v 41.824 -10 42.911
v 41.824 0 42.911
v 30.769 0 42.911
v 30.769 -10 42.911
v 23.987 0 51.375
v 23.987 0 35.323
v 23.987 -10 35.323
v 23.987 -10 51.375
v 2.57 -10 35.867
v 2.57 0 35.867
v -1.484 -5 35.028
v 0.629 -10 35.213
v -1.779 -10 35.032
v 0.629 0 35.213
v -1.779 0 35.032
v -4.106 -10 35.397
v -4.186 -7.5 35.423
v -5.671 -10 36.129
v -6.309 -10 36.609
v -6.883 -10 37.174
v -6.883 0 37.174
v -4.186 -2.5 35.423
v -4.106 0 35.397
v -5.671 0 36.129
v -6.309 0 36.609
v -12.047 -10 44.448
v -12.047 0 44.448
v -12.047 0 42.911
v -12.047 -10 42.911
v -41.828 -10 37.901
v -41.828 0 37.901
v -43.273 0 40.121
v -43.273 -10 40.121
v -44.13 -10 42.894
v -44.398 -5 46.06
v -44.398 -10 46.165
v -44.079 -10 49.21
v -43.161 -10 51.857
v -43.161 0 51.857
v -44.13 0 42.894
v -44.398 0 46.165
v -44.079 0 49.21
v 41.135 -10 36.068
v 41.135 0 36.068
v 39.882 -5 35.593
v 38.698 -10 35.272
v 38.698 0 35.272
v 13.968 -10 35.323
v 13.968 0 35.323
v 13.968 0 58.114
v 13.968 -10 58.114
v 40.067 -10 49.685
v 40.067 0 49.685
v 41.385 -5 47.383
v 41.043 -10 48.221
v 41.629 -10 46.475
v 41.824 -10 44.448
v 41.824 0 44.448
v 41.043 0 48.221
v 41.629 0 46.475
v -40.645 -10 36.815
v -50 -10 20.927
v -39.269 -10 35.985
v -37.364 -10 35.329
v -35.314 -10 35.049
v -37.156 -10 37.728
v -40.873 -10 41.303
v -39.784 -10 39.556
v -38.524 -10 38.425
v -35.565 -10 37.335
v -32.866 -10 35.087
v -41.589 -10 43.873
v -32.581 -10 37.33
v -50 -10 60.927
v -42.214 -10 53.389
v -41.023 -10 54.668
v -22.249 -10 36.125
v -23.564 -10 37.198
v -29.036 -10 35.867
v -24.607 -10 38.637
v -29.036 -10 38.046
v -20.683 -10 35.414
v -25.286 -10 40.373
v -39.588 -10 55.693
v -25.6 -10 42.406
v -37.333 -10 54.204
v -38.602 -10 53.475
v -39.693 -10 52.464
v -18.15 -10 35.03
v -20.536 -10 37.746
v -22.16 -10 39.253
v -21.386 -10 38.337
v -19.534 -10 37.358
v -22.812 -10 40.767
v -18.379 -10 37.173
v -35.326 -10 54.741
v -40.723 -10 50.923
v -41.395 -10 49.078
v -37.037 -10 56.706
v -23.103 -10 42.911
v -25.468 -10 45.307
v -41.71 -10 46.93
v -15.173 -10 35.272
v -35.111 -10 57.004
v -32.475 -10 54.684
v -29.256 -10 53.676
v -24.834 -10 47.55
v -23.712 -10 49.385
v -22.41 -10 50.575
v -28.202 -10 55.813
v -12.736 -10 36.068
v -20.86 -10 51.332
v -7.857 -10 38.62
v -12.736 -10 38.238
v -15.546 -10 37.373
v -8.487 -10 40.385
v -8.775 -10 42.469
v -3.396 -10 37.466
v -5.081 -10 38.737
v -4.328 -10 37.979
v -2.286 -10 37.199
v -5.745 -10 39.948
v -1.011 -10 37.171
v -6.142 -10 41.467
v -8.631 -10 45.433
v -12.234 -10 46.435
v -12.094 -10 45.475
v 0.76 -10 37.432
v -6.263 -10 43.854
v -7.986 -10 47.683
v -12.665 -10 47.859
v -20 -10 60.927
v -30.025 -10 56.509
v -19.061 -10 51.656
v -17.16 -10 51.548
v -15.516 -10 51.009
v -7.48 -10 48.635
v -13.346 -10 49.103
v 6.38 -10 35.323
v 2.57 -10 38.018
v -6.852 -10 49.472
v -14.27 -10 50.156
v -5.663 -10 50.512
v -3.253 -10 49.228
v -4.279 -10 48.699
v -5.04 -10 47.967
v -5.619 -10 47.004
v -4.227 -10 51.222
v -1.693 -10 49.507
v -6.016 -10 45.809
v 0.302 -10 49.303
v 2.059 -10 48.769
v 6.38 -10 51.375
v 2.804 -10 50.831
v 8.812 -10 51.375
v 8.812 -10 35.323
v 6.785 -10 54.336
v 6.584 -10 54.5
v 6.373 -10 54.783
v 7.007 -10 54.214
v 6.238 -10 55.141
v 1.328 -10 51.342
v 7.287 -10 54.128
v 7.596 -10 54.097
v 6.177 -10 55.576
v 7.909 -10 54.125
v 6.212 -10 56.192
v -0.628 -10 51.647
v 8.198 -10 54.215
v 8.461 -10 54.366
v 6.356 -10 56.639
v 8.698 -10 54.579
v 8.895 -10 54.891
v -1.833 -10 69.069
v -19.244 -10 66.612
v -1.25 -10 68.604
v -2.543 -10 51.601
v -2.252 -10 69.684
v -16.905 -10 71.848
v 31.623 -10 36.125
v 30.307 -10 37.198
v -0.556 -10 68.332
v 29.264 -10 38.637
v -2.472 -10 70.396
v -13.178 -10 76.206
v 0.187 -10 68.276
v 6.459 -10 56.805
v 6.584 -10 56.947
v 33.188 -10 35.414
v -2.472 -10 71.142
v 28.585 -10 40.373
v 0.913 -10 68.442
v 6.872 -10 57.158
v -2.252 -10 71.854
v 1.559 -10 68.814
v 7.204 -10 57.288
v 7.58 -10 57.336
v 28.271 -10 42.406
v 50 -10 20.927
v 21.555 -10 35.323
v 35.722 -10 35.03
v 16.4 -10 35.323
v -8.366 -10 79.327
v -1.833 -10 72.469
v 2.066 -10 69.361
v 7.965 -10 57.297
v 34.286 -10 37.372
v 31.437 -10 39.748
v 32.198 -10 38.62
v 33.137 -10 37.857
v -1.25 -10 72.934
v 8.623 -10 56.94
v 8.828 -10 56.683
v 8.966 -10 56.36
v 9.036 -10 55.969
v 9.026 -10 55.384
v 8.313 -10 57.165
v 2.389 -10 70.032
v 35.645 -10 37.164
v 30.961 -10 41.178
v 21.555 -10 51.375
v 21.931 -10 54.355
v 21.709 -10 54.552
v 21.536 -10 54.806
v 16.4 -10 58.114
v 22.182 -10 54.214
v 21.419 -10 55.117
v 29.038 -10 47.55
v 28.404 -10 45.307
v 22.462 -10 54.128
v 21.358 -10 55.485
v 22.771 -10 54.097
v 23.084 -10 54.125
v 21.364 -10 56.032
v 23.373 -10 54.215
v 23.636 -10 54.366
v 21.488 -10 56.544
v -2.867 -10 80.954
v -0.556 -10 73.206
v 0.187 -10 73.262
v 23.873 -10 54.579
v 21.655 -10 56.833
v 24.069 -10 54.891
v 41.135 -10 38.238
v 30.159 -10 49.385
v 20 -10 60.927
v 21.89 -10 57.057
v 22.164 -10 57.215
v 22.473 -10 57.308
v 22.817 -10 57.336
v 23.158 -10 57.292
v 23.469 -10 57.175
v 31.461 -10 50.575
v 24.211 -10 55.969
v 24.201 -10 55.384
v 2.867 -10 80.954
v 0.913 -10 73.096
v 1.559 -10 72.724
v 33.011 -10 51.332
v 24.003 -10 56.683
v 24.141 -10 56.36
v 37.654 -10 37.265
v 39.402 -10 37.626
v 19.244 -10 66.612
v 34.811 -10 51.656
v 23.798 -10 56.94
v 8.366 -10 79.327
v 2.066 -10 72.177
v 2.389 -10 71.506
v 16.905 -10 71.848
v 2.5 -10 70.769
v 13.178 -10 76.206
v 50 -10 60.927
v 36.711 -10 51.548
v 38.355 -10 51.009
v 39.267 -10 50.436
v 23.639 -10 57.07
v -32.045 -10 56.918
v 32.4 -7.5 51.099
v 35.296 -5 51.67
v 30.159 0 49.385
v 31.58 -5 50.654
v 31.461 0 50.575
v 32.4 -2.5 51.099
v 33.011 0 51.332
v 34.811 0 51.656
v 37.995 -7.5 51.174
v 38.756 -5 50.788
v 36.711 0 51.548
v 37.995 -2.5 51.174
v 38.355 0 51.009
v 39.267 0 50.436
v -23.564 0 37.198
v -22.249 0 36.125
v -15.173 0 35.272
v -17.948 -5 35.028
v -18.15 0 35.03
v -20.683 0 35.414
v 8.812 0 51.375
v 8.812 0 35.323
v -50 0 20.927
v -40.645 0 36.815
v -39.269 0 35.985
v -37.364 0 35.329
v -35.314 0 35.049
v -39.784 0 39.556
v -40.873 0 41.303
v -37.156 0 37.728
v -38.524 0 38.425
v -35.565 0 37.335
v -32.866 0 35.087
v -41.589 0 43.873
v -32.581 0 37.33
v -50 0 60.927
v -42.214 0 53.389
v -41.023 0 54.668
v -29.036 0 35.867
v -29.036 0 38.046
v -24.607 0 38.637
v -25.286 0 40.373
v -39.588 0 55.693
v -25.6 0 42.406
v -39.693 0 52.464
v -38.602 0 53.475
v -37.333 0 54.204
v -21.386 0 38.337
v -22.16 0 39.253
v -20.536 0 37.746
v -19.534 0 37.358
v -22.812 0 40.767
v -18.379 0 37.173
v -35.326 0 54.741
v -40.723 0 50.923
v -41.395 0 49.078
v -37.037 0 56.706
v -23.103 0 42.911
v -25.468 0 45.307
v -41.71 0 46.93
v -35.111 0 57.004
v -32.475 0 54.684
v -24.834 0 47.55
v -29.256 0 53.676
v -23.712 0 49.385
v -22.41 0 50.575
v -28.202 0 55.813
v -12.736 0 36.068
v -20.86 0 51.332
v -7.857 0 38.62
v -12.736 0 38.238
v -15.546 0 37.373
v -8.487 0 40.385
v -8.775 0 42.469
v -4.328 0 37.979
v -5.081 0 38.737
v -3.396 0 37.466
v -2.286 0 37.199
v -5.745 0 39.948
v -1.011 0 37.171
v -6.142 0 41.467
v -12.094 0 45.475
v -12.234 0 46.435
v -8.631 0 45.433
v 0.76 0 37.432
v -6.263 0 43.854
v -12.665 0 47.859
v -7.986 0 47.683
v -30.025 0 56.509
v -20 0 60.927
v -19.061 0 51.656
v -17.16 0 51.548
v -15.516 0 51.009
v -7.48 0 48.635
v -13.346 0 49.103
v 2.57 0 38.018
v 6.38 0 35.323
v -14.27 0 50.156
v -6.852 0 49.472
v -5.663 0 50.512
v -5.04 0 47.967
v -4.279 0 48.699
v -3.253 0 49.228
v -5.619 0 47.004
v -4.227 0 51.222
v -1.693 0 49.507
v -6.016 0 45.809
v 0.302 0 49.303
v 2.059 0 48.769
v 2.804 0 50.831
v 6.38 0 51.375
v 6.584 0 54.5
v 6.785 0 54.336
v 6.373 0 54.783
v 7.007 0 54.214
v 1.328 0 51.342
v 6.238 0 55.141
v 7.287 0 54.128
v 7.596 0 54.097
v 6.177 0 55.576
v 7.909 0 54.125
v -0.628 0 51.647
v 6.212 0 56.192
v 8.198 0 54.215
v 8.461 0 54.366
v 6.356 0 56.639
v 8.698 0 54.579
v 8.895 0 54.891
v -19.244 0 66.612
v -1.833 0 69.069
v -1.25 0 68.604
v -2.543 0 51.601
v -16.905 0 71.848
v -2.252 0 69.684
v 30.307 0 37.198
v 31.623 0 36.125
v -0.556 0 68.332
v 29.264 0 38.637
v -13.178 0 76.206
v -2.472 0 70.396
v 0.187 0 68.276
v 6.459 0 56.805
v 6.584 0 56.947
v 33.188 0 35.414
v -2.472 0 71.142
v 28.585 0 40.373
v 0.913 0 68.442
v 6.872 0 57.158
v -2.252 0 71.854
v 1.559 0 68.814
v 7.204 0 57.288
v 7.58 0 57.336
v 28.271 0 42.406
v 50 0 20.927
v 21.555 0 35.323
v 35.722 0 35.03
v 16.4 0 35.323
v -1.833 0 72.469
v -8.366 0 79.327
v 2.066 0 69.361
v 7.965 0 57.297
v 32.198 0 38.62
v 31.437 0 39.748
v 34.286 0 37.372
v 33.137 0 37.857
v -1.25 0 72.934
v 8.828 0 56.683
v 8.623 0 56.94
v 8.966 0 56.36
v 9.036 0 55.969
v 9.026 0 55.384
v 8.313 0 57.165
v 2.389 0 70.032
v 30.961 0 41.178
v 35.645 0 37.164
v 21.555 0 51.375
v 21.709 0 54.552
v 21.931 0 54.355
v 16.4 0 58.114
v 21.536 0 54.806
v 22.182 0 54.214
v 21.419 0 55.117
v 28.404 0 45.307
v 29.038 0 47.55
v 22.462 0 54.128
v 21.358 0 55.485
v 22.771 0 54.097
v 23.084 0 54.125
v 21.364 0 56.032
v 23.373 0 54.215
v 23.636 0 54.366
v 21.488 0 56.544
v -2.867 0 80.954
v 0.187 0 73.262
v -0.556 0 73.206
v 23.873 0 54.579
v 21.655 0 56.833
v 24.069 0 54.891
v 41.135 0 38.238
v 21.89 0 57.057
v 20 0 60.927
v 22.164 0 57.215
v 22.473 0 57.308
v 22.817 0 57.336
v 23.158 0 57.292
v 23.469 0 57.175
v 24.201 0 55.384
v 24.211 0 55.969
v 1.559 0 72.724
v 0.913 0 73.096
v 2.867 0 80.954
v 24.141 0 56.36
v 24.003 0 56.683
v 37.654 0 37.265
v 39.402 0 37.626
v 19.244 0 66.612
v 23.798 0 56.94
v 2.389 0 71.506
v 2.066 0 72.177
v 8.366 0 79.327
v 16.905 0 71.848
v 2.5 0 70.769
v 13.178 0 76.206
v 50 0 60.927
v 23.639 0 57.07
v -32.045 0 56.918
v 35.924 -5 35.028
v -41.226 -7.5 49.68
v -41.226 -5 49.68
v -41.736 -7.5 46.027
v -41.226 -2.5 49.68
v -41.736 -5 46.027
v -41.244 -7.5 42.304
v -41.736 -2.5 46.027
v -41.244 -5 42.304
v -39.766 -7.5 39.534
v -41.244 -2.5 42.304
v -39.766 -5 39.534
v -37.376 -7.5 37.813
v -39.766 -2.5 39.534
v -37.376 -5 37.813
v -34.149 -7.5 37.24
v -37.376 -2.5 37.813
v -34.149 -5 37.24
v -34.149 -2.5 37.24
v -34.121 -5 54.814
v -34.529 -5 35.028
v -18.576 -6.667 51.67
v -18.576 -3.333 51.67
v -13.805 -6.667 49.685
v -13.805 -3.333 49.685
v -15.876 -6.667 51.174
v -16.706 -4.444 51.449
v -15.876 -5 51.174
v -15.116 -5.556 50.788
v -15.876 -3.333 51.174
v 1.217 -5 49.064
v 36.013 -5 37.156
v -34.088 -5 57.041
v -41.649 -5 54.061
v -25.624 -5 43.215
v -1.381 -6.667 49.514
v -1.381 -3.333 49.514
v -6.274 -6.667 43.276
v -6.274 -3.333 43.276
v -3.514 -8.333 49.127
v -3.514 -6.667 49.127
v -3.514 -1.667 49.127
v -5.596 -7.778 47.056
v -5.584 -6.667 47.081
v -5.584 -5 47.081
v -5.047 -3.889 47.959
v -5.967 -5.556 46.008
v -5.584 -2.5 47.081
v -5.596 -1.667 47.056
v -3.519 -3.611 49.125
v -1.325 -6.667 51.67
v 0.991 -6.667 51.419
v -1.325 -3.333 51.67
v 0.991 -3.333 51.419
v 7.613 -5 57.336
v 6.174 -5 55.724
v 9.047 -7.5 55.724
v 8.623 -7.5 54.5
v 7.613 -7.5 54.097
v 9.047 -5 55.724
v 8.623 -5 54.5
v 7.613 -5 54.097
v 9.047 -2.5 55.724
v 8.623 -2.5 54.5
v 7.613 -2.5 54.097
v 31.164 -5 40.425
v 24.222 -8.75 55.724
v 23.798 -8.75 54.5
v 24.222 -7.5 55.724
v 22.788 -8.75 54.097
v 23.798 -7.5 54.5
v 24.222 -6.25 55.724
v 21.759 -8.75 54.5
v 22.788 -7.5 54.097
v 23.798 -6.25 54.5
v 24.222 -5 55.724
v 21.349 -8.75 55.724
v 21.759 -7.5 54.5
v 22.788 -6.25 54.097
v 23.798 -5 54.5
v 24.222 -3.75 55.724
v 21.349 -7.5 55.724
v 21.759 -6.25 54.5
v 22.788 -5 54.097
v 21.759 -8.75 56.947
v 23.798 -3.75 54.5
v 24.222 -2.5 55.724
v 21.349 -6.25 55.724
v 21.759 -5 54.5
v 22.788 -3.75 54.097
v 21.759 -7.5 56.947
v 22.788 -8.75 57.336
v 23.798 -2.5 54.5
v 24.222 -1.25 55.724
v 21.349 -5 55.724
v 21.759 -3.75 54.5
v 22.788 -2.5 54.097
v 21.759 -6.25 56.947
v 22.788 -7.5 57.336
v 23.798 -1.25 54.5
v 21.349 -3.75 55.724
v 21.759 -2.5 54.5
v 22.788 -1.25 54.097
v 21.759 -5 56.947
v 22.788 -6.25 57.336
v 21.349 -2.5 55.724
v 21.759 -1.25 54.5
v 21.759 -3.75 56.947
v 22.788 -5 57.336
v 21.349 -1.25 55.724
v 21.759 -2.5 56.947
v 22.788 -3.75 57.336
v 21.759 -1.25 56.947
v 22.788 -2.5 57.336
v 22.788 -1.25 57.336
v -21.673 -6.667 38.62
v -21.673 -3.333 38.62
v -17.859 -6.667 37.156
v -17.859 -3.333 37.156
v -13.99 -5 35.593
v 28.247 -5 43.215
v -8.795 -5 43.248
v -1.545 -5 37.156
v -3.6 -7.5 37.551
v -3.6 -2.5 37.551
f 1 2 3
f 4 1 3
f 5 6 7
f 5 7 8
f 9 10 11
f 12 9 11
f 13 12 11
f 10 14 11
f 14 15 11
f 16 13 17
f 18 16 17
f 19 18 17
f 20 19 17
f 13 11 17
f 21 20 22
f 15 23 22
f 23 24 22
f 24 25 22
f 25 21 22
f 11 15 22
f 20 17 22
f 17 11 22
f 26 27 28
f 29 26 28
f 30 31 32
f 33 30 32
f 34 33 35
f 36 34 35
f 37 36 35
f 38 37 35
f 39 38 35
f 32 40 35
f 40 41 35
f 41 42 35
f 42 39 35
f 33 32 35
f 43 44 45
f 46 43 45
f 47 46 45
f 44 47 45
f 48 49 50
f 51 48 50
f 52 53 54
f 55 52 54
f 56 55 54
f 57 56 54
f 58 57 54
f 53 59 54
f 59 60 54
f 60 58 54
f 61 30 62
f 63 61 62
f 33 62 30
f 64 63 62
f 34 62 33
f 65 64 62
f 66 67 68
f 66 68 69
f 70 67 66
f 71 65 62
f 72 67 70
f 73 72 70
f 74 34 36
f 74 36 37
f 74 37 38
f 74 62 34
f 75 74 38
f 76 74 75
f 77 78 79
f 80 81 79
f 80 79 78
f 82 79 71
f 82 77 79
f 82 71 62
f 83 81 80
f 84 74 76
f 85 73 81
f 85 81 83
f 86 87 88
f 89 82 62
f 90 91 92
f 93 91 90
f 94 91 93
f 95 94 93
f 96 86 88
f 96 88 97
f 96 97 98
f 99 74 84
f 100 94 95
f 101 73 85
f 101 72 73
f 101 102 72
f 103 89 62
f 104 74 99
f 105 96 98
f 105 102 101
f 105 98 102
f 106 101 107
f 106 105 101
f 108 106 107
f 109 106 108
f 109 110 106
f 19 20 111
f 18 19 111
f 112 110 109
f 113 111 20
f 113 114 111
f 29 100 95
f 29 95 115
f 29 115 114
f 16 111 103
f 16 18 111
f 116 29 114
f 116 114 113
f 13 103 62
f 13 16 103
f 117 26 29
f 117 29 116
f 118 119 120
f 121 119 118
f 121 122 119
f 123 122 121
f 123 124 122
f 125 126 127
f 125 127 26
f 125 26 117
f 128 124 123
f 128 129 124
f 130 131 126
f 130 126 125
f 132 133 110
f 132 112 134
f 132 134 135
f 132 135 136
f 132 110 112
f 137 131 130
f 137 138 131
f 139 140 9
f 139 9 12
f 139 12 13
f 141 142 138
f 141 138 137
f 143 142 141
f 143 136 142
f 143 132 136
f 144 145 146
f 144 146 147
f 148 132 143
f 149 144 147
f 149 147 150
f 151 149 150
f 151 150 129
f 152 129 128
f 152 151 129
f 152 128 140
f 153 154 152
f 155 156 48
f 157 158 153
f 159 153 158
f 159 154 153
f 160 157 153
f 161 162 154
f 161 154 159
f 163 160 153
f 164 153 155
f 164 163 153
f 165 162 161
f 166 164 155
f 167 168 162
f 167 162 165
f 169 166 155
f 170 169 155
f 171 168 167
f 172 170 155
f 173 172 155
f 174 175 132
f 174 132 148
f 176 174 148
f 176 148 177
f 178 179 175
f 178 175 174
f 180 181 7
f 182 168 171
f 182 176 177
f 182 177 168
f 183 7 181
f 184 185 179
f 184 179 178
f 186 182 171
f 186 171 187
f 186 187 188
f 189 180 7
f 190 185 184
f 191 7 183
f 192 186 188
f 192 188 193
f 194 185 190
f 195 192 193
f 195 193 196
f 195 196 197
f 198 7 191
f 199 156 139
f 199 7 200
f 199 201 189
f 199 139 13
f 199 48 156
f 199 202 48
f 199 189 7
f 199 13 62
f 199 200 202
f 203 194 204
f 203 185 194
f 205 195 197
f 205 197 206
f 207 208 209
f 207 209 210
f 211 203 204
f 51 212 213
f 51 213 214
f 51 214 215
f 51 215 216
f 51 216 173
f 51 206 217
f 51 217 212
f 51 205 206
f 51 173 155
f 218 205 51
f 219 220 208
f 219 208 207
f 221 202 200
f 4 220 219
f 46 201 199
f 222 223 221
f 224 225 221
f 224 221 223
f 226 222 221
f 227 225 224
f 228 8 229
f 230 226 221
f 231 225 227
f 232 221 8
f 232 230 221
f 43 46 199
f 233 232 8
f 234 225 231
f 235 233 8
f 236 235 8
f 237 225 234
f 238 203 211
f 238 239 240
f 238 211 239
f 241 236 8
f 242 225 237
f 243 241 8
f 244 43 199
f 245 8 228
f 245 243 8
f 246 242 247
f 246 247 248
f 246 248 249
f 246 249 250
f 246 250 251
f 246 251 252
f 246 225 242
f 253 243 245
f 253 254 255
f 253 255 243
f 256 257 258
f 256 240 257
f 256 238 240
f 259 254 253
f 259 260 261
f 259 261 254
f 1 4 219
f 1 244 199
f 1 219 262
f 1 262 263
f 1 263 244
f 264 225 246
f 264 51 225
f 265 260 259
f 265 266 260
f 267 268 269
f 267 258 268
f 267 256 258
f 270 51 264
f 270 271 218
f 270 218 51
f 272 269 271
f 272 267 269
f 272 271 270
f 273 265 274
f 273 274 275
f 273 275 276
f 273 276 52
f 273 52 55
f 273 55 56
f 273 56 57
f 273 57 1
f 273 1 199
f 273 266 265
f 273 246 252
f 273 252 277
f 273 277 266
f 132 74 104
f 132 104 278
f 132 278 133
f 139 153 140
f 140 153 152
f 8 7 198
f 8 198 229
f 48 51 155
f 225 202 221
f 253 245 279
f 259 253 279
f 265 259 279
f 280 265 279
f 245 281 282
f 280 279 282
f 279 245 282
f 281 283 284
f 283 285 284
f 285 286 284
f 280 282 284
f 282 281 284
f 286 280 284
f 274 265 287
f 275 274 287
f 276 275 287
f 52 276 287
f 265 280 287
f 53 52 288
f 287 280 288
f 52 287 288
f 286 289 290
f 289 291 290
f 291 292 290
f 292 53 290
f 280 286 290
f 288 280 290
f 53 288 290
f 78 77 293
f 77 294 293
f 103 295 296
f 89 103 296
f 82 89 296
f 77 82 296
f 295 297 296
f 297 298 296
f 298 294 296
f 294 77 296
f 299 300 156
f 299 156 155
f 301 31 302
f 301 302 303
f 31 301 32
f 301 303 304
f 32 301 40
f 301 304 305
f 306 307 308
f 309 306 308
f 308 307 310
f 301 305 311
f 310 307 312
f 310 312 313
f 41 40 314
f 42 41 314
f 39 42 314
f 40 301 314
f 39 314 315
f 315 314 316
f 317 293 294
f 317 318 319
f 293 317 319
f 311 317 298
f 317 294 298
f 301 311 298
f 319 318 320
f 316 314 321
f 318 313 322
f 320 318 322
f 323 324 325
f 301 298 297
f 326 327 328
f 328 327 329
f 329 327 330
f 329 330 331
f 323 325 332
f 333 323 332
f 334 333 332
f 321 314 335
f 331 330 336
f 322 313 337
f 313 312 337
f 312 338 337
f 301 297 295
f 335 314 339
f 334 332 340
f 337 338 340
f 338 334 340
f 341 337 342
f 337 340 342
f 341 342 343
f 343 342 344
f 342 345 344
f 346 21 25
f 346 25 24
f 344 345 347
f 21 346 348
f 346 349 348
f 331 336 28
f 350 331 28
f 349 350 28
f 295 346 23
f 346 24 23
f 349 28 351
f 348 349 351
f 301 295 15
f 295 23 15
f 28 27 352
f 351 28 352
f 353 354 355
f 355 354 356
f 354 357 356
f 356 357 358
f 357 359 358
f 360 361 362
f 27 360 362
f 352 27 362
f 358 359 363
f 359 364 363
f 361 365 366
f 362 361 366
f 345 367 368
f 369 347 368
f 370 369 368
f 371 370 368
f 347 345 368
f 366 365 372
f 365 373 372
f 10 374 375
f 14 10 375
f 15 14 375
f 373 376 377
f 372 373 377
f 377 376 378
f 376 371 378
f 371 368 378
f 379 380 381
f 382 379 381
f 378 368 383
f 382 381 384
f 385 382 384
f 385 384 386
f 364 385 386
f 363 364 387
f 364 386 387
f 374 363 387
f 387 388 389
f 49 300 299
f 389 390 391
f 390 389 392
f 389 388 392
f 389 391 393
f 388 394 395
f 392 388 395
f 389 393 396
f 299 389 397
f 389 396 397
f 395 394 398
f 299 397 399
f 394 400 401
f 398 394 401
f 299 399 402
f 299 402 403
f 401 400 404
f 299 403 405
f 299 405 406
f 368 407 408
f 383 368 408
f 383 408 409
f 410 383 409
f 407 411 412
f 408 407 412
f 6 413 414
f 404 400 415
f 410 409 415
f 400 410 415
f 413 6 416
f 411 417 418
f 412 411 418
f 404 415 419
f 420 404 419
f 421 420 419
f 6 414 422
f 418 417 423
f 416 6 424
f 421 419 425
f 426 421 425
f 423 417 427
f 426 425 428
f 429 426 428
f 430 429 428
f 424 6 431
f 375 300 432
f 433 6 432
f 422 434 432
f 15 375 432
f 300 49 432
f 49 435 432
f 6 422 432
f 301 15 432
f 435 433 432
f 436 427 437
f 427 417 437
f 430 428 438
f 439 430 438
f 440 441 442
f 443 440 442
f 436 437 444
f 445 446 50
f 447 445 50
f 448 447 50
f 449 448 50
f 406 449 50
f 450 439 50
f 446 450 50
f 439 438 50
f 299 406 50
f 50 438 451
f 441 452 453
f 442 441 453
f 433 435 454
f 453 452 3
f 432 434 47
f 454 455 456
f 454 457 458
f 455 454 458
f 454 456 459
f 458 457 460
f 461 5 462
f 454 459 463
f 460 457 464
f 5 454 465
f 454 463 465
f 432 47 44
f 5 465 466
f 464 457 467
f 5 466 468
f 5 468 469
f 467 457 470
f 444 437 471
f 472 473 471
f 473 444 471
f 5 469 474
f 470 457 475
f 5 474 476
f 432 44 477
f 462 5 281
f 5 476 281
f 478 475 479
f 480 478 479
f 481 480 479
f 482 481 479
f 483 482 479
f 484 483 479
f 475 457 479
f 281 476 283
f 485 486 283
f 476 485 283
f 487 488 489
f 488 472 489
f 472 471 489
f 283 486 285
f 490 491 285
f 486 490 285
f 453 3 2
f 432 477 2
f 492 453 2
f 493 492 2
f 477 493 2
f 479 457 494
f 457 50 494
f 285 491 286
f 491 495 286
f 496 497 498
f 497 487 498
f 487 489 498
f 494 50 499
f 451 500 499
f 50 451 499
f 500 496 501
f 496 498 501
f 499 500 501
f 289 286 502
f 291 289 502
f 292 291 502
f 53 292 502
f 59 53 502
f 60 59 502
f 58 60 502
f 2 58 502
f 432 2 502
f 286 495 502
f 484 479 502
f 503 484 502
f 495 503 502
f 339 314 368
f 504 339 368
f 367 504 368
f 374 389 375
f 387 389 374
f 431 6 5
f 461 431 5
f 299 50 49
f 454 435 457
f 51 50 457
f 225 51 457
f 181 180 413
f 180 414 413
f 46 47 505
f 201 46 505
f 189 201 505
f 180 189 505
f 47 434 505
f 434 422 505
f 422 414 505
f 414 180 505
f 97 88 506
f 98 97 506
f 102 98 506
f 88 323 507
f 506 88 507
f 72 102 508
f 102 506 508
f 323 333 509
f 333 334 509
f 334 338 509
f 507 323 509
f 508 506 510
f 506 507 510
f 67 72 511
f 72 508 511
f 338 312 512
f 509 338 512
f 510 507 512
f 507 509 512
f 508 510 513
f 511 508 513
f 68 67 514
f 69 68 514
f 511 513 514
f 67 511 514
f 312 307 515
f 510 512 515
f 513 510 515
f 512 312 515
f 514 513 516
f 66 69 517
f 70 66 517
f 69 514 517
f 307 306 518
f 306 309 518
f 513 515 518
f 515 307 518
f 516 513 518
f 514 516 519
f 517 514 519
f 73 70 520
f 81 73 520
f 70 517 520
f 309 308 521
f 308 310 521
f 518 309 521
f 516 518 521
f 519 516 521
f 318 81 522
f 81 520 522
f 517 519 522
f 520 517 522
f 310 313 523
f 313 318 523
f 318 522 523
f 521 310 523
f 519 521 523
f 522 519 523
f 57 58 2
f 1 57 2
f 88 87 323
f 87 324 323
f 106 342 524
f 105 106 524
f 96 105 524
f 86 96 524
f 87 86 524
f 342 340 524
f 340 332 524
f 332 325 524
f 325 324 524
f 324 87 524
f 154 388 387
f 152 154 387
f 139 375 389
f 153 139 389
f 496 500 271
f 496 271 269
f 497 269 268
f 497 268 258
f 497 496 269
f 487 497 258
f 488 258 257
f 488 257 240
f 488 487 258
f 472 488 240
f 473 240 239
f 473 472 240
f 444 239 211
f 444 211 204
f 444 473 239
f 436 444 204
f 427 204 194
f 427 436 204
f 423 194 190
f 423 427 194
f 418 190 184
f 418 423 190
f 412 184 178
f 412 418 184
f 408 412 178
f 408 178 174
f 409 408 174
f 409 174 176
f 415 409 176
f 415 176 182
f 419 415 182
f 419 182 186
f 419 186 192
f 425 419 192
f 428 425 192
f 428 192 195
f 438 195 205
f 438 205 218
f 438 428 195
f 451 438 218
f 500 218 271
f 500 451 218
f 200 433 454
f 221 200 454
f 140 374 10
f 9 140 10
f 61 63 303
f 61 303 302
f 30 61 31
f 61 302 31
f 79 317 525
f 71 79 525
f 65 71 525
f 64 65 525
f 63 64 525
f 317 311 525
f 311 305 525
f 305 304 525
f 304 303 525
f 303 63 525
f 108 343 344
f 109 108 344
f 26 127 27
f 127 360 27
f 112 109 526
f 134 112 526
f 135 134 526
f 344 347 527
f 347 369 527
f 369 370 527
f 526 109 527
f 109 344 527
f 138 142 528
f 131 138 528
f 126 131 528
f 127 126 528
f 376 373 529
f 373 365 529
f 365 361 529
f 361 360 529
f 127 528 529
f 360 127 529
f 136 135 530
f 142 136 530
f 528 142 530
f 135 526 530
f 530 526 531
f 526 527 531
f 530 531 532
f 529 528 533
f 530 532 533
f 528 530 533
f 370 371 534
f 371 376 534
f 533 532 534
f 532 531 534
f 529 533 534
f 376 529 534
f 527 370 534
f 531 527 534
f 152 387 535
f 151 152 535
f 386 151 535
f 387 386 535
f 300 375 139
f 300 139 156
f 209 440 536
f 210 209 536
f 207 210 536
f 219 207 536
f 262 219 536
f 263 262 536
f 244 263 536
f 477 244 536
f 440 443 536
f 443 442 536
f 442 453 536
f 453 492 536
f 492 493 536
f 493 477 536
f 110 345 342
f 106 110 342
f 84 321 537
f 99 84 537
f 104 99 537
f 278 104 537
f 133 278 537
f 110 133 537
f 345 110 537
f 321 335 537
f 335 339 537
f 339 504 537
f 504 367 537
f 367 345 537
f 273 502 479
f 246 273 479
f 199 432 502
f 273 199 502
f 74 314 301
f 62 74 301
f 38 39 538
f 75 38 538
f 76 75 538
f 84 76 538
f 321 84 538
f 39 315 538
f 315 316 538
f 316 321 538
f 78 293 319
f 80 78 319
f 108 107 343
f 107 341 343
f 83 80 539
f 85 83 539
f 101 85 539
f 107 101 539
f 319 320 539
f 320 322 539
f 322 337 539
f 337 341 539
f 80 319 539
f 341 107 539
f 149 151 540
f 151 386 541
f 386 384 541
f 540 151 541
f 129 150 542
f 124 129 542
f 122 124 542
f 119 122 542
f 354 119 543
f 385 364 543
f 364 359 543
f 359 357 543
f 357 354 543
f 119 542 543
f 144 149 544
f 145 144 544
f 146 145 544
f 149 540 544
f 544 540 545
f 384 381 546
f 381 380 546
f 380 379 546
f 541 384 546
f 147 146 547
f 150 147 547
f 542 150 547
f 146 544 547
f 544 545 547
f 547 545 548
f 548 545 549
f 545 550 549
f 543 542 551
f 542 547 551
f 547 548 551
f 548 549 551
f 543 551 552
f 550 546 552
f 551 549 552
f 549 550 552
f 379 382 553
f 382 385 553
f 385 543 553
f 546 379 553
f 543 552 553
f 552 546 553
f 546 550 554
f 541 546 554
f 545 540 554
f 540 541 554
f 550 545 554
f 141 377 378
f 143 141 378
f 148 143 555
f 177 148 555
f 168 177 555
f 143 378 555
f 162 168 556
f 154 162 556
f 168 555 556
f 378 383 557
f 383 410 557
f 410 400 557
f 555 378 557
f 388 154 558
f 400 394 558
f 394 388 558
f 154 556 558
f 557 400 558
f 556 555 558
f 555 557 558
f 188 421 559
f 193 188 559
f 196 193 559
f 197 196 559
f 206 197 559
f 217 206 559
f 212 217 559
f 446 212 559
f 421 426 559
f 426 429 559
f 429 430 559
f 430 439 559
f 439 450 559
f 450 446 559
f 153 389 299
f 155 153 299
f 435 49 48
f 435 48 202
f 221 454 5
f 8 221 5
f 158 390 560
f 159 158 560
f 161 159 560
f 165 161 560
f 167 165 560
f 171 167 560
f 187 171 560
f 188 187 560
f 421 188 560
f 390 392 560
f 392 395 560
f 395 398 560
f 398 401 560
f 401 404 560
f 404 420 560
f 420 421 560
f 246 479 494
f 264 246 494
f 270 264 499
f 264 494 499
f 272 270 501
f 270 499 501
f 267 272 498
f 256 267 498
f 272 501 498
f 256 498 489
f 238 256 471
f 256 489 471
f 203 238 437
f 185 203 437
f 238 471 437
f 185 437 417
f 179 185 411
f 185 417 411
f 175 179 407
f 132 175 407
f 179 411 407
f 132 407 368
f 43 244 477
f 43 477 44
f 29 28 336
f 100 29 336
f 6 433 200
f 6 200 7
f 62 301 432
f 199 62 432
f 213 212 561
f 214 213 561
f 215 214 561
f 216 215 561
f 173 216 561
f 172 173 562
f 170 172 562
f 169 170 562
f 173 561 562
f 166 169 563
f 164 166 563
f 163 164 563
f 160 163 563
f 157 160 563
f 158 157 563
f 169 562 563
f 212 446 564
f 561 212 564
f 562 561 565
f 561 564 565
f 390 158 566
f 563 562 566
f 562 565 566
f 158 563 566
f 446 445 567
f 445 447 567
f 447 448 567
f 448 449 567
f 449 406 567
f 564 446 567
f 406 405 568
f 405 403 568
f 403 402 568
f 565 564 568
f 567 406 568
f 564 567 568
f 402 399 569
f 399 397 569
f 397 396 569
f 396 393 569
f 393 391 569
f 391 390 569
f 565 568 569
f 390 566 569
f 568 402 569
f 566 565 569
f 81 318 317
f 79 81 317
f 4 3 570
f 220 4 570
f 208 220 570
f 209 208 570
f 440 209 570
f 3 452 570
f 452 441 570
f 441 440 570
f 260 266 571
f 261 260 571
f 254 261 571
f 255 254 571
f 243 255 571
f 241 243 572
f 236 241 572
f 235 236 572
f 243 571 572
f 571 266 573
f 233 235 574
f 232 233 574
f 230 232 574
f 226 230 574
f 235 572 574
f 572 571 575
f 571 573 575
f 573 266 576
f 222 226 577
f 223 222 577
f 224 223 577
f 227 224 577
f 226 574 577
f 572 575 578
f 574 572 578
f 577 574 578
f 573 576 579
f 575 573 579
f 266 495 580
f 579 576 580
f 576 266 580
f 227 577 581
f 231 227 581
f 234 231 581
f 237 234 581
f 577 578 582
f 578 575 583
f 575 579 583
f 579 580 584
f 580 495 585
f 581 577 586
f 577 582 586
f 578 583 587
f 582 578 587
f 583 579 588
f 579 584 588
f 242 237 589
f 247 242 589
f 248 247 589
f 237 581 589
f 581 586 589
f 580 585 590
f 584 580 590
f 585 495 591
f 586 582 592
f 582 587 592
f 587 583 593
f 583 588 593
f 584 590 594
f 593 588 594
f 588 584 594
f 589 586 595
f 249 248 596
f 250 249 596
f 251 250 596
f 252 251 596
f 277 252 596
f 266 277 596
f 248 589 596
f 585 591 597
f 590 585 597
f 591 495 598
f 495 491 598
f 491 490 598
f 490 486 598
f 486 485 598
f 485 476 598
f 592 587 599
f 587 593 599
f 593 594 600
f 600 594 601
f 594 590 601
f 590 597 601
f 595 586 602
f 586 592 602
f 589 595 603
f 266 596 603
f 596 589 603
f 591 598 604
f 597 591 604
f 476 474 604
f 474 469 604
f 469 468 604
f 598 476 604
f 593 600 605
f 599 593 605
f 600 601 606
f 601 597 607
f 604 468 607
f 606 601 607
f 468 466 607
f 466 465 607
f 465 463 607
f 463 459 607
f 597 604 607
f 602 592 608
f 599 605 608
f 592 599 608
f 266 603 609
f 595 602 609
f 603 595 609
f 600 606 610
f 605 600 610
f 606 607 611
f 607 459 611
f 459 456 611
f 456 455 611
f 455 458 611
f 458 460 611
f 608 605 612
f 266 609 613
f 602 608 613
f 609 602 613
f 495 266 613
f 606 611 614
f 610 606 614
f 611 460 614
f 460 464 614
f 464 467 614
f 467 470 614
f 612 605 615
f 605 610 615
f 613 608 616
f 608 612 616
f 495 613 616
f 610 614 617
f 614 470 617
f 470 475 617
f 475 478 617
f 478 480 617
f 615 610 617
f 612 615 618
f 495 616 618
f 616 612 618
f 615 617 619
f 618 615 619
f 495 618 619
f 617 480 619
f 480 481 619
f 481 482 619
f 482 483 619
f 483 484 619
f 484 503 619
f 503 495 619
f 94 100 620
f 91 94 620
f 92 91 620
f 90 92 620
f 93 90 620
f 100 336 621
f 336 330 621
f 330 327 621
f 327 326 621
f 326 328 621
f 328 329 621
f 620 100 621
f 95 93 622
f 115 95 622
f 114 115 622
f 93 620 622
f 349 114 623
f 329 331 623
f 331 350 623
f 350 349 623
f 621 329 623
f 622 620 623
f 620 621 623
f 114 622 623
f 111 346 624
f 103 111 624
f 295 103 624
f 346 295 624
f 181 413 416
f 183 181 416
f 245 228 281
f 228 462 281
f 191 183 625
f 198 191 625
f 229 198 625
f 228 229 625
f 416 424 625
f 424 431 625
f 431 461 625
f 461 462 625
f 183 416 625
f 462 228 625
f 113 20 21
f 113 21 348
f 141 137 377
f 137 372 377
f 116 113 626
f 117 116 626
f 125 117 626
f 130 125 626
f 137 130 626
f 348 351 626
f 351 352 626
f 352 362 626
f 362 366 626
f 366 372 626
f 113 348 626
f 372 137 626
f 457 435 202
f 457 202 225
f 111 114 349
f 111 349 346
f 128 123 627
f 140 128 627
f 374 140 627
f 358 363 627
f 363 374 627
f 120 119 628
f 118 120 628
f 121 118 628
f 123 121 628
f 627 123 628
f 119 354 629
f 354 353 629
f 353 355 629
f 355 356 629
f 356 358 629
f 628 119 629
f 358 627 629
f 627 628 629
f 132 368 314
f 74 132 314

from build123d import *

# Parameters (mm, degrees)
F0_W     = 2.4323057696
F0_H     = 16.0513434701
F0_H_2   = 22.7905644657
F0_R     = 2.5
F1_DEPTH = 10


with BuildPart() as f1:
    # F0 (on Front) → F1 (new body)
    with BuildSketch(Plane.XZ):
        with BuildLine():
            Line((-50, 60.9273851891), (-50, 20.9273851891))
            Line((-50, 20.9273851891), (50, 20.9273851891))
            Line((50, 20.9273851891), (50, 60.9273851891))
            Line((50, 60.9273851891), (20, 60.9273851891))
            ThreePointArc((20, 60.9273851891), (0, 81.1604265208), (-20, 60.9273851891))
            Line((-20, 60.9273851891), (-50, 60.9273851891))
        make_face()
        with BuildLine():
            add(Edge.make_bspline(
                [(-29.2562490754, 53.6756249348), (-31.688554845, 54.8144501796), (-34.1208606146, 54.8144501796)],
                knots=[0, 0, 0, 1, 1, 1], degree=2))
            add(Edge.make_bspline(
                [(-34.1208606146, 54.8144501796), (-37.6498129162, 54.8144501796), (-39.6931372237, 52.4641585736)],
                knots=[0, 0, 0, 1, 1, 1], degree=2))
            add(Edge.make_bspline(
                [(-39.6931372237, 52.4641585736), (-41.7364615311, 50.1138669677), (-41.7364615311, 46.0272183529)],
                knots=[0, 0, 0, 1, 1, 1], degree=2))
            add(Edge.make_bspline(
                [(-41.7364615311, 46.0272183529), (-41.7364615311, 41.8280931706), (-39.7657783401, 39.5340398484)],
                knots=[0, 0, 0, 1, 1, 1], degree=2))
            add(Edge.make_bspline(
                [(-39.7657783401, 39.5340398484), (-37.7950951491, 37.2399865262), (-34.1489797565, 37.2399865262)],
                knots=[0, 0, 0, 1, 1, 1], degree=2))
            add(Edge.make_bspline(
                [(-34.1489797565, 37.2399865262), (-31.9088214561, 37.2399865262), (-29.0359824643, 38.0460685924)],
                knots=[0, 0, 0, 1, 1, 1], degree=2))
            Line((-29.0359824643, 38.0460685924), (-29.0359824643, 35.8668350994))
            add(Edge.make_bspline(
                [(-29.0359824643, 35.8668350994), (-31.2620811937, 35.0279473676), (-34.5285881714, 35.0279473676)],
                knots=[0, 0, 0, 1, 1, 1], degree=2))
            add(Edge.make_bspline(
                [(-34.5285881714, 35.0279473676), (-39.2572905251, 35.0279473676), (-41.8278487421, 37.9007863595)],
                knots=[0, 0, 0, 1, 1, 1], degree=2))
            add(Edge.make_bspline(
                [(-41.8278487421, 37.9007863595), (-44.3984069592, 40.7736253514), (-44.3984069592, 46.0600240183)],
                knots=[0, 0, 0, 1, 1, 1], degree=2))
            add(Edge.make_bspline(
                [(-44.3984069592, 46.0600240183), (-44.3984069592, 49.3687097088), (-43.161164718, 51.8572537621)],
                knots=[0, 0, 0, 1, 1, 1], degree=2))
            add(Edge.make_bspline(
                [(-43.161164718, 51.8572537621), (-41.9239224768, 54.3457978155), (-39.5876904418, 55.6931733622)],
                knots=[0, 0, 0, 1, 1, 1], degree=2))
            add(Edge.make_bspline(
                [(-39.5876904418, 55.6931733622), (-37.2514584068, 57.040548909), (-34.0880549492, 57.040548909)],
                knots=[0, 0, 0, 1, 1, 1], degree=2))
            add(Edge.make_bspline(
                [(-34.0880549492, 57.040548909), (-30.723130975, 57.040548909), (-28.2017812562, 55.8126797151)],
                knots=[0, 0, 0, 1, 1, 1], degree=2))
            Line((-28.2017812562, 55.8126797151), (-29.2562490754, 53.6756249348))
        make_face(mode=Mode.SUBTRACT)
        with BuildLine():
            add(Edge.make_bspline(
                [(-15.1732455345, 35.271646597), (-16.3214438265, 35.0279473676), (-17.9476675299, 35.0279473676)],
                knots=[0, 0, 0, 1, 1, 1], degree=2))
            add(Edge.make_bspline(
                [(-17.9476675299, 35.0279473676), (-21.5047389733, 35.0279473676), (-23.5644661135, 37.1978078134)],
                knots=[0, 0, 0, 1, 1, 1], degree=2))
            add(Edge.make_bspline(
                [(-23.5644661135, 37.1978078134), (-25.6241932537, 39.3676682591), (-25.6241932537, 43.2153041683)],
                knots=[0, 0, 0, 1, 1, 1], degree=2))
            add(Edge.make_bspline(
                [(-25.6241932537, 43.2153041683), (-25.6241932537, 47.1004322666), (-23.7120916082, 49.3851125416)],
                knots=[0, 0, 0, 1, 1, 1], degree=2))
            add(Edge.make_bspline(
                [(-23.7120916082, 49.3851125416), (-21.7999899627, 51.6697928165), (-18.5756616978, 51.6697928165)],
                knots=[0, 0, 0, 1, 1, 1], degree=2))
            add(Edge.make_bspline(
                [(-18.5756616978, 51.6697928165), (-15.5622269966, 51.6697928165), (-13.8047806313, 49.6850500546)],
                knots=[0, 0, 0, 1, 1, 1], degree=2))
            add(Edge.make_bspline(
                [(-13.8047806313, 49.6850500546), (-12.047334266, 47.7003072927), (-12.047334266, 44.4478598859)],
                knots=[0, 0, 0, 1, 1, 1], degree=2))
            Line((-12.047334266, 44.4478598859), (-12.047334266, 42.9106801317))
            Line((-12.047334266, 42.9106801317), (-23.1028435349, 42.9106801317))
            add(Edge.make_bspline(
                [(-23.1028435349, 42.9106801317), (-23.0278591566, 40.0847063762), (-21.6734538244, 38.6201677384)],
                knots=[0, 0, 0, 1, 1, 1], degree=2))
            add(Edge.make_bspline(
                [(-21.6734538244, 38.6201677384), (-20.3190484922, 37.1556291006), (-17.8586235807, 37.1556291006)],
                knots=[0, 0, 0, 1, 1, 1], degree=2))
            add(Edge.make_bspline(
                [(-17.8586235807, 37.1556291006), (-15.2669760073, 37.1556291006), (-12.7362532412, 38.2382160617)],
                knots=[0, 0, 0, 1, 1, 1], degree=2))
            Line((-12.7362532412, 38.2382160617), (-12.7362532412, 36.0683556159))
            add(Edge.make_bspline(
                [(-12.7362532412, 36.0683556159), (-14.0250472424, 35.5153458263), (-15.1732455345, 35.271646597)],
                knots=[0, 0, 0, 1, 1, 1], degree=2))
        make_face(mode=Mode.SUBTRACT)
        with BuildLine():
            add(Edge.make_bspline(
                [(2.56993297, 35.8668350994), (0.9624553612, 35.0279473676), (-1.4839099794, 35.0279473676)],
                knots=[0, 0, 0, 1, 1, 1], degree=2))
            add(Edge.make_bspline(
                [(-1.4839099794, 35.0279473676), (-4.9706835682, 35.0279473676), (-6.8827852137, 37.1743751952)],
                knots=[0, 0, 0, 1, 1, 1], degree=2))
            add(Edge.make_bspline(
                [(-6.8827852137, 37.1743751952), (-8.7948868592, 39.3208030227), (-8.7948868592, 43.2481098338)],
                knots=[0, 0, 0, 1, 1, 1], degree=2))
            add(Edge.make_bspline(
                [(-8.7948868592, 43.2481098338), (-8.7948868592, 47.2738336413), (-6.85232281, 49.4718132289)],
                knots=[0, 0, 0, 1, 1, 1], degree=2))
            add(Edge.make_bspline(
                [(-6.85232281, 49.4718132289), (-4.9097587609, 51.6697928165), (-1.3245681756, 51.6697928165)],
                knots=[0, 0, 0, 1, 1, 1], degree=2))
            add(Edge.make_bspline(
                [(-1.3245681756, 51.6697928165), (-0.1669968363, 51.6697928165), (0.990574503, 51.4190638017)],
                knots=[0, 0, 0, 1, 1, 1], degree=2))
            add(Edge.make_bspline(
                [(0.990574503, 51.4190638017), (2.1481458423, 51.1683347869), (2.8042591521, 50.8309050848)],
                knots=[0, 0, 0, 1, 1, 1], degree=2))
            Line((2.8042591521, 50.8309050848), (2.0591018932, 48.7688346828))
            add(Edge.make_bspline(
                [(2.0591018932, 48.7688346828), (1.2530198269, 49.092204814), (0.3016555278, 49.3030983779)],
                knots=[0, 0, 0, 1, 1, 1], degree=2))
            add(Edge.make_bspline(
                [(0.3016555278, 49.3030983779), (-0.6497087713, 49.5139919417), (-1.3808064593, 49.5139919417)],
                knots=[0, 0, 0, 1, 1, 1], degree=2))
            add(Edge.make_bspline(
                [(-1.3808064593, 49.5139919417), (-6.2735371404, 49.5139919417), (-6.2735371404, 43.2762289756)],
                knots=[0, 0, 0, 1, 1, 1], degree=2))
            add(Edge.make_bspline(
                [(-6.2735371404, 43.2762289756), (-6.2735371404, 40.3190325582), (-5.0808168738, 38.7373308294)],
                knots=[0, 0, 0, 1, 1, 1], degree=2))
            add(Edge.make_bspline(
                [(-5.0808168738, 38.7373308294), (-3.8880966071, 37.1556291006), (-1.5448347867, 37.1556291006)],
                knots=[0, 0, 0, 1, 1, 1], degree=2))
            add(Edge.make_bspline(
                [(-1.5448347867, 37.1556291006), (0.4609973316, 37.1556291006), (2.56993297, 38.0179494505)],
                knots=[0, 0, 0, 1, 1, 1], degree=2))
            Line((2.56993297, 38.0179494505), (2.56993297, 35.8668350994))
        make_face(mode=Mode.SUBTRACT)
        with Locations((7.5962295749, 43.3488700921)):
            Rectangle(F0_W, F0_H, mode=Mode.SUBTRACT)
        with Locations((22.7711931242, 43.3488700921)):
            Rectangle(F0_W, F0_H, mode=Mode.SUBTRACT)
        with Locations((15.1837113495, 46.7184805899)):
            Rectangle(F0_W, F0_H_2, mode=Mode.SUBTRACT)
        with BuildLine():
            add(Edge.make_bspline(
                [(38.6983437178, 35.271646597), (37.5501454258, 35.0279473676), (35.9239217224, 35.0279473676)],
                knots=[0, 0, 0, 1, 1, 1], degree=2))
            add(Edge.make_bspline(
                [(35.9239217224, 35.0279473676), (32.3668502789, 35.0279473676), (30.3071231387, 37.1978078134)],
                knots=[0, 0, 0, 1, 1, 1], degree=2))
            add(Edge.make_bspline(
                [(30.3071231387, 37.1978078134), (28.2473959986, 39.3676682591), (28.2473959986, 43.2153041683)],
                knots=[0, 0, 0, 1, 1, 1], degree=2))
            add(Edge.make_bspline(
                [(28.2473959986, 43.2153041683), (28.2473959986, 47.1004322666), (30.1594976441, 49.3851125416)],
                knots=[0, 0, 0, 1, 1, 1], degree=2))
            add(Edge.make_bspline(
                [(30.1594976441, 49.3851125416), (32.0715992895, 51.6697928165), (35.2959275545, 51.6697928165)],
                knots=[0, 0, 0, 1, 1, 1], degree=2))
            add(Edge.make_bspline(
                [(35.2959275545, 51.6697928165), (38.3093622556, 51.6697928165), (40.0668086209, 49.6850500546)],
                knots=[0, 0, 0, 1, 1, 1], degree=2))
            add(Edge.make_bspline(
                [(40.0668086209, 49.6850500546), (41.8242549863, 47.7003072927), (41.8242549863, 44.4478598859)],
                knots=[0, 0, 0, 1, 1, 1], degree=2))
            Line((41.8242549863, 44.4478598859), (41.8242549863, 42.9106801317))
            Line((41.8242549863, 42.9106801317), (30.7687457174, 42.9106801317))
            add(Edge.make_bspline(
                [(30.7687457174, 42.9106801317), (30.8437300956, 40.0847063762), (32.1981354278, 38.6201677384)],
                knots=[0, 0, 0, 1, 1, 1], degree=2))
            add(Edge.make_bspline(
                [(32.1981354278, 38.6201677384), (33.5525407601, 37.1556291006), (36.0129656715, 37.1556291006)],
                knots=[0, 0, 0, 1, 1, 1], degree=2))
            add(Edge.make_bspline(
                [(36.0129656715, 37.1556291006), (38.604613245, 37.1556291006), (41.1353360111, 38.2382160617)],
                knots=[0, 0, 0, 1, 1, 1], degree=2))
            Line((41.1353360111, 38.2382160617), (41.1353360111, 36.0683556159))
            add(Edge.make_bspline(
                [(41.1353360111, 36.0683556159), (39.8465420098, 35.5153458263), (38.6983437178, 35.271646597)],
                knots=[0, 0, 0, 1, 1, 1], degree=2))
        make_face(mode=Mode.SUBTRACT)
        with BuildLine():
            add(Edge.make_bspline(
                [(6.5839404685, 54.5004530956), (6.1738696499, 54.9034941287), (6.1738696499, 55.7236357659)],
                knots=[0, 0, 0, 1, 1, 1], degree=2))
            add(Edge.make_bspline(
                [(6.1738696499, 55.7236357659), (6.1738696499, 56.557836974), (6.5839404685, 56.9468184362)],
                knots=[0, 0, 0, 1, 1, 1], degree=2))
            add(Edge.make_bspline(
                [(6.5839404685, 56.9468184362), (6.994011287, 57.3357998984), (7.6126324076, 57.3357998984)],
                knots=[0, 0, 0, 1, 1, 1], degree=2))
            add(Edge.make_bspline(
                [(7.6126324076, 57.3357998984), (8.1984478628, 57.3357998984), (8.6225782523, 56.9397886507)],
                knots=[0, 0, 0, 1, 1, 1], degree=2))
            add(Edge.make_bspline(
                [(8.6225782523, 56.9397886507), (9.0467086418, 56.5437774031), (9.0467086418, 55.7236357659)],
                knots=[0, 0, 0, 1, 1, 1], degree=2))
            add(Edge.make_bspline(
                [(9.0467086418, 55.7236357659), (9.0467086418, 54.9034941287), (8.6225782523, 54.5004530956)],
                knots=[0, 0, 0, 1, 1, 1], degree=2))
            add(Edge.make_bspline(
                [(8.6225782523, 54.5004530956), (8.1984478628, 54.0974120625), (7.6126324076, 54.0974120625)],
                knots=[0, 0, 0, 1, 1, 1], degree=2))
            add(Edge.make_bspline(
                [(7.6126324076, 54.0974120625), (6.994011287, 54.0974120625), (6.5839404685, 54.5004530956)],
                knots=[0, 0, 0, 1, 1, 1], degree=2))
        make_face(mode=Mode.SUBTRACT)
        with BuildLine():
            add(Edge.make_bspline(
                [(21.7589040177, 54.5004530956), (21.3488331991, 54.9034941287), (21.3488331991, 55.7236357659)],
                knots=[0, 0, 0, 1, 1, 1], degree=2))
            add(Edge.make_bspline(
                [(21.3488331991, 55.7236357659), (21.3488331991, 56.557836974), (21.7589040177, 56.9468184362)],
                knots=[0, 0, 0, 1, 1, 1], degree=2))
            add(Edge.make_bspline(
                [(21.7589040177, 56.9468184362), (22.1689748363, 57.3357998984), (22.7875959569, 57.3357998984)],
                knots=[0, 0, 0, 1, 1, 1], degree=2))
            add(Edge.make_bspline(
                [(22.7875959569, 57.3357998984), (23.373411412, 57.3357998984), (23.7975418015, 56.9397886507)],
                knots=[0, 0, 0, 1, 1, 1], degree=2))
            add(Edge.make_bspline(
                [(23.7975418015, 56.9397886507), (24.221672191, 56.5437774031), (24.221672191, 55.7236357659)],
                knots=[0, 0, 0, 1, 1, 1], degree=2))
            add(Edge.make_bspline(
                [(24.221672191, 55.7236357659), (24.221672191, 54.9034941287), (23.7975418015, 54.5004530956)],
                knots=[0, 0, 0, 1, 1, 1], degree=2))
            add(Edge.make_bspline(
                [(23.7975418015, 54.5004530956), (23.373411412, 54.0974120625), (22.7875959569, 54.0974120625)],
                knots=[0, 0, 0, 1, 1, 1], degree=2))
            add(Edge.make_bspline(
                [(22.7875959569, 54.0974120625), (22.1689748363, 54.0974120625), (21.7589040177, 54.5004530956)],
                knots=[0, 0, 0, 1, 1, 1], degree=2))
        make_face(mode=Mode.SUBTRACT)
        with Locations((0, 70.7689598203)):
            Circle(F0_R, mode=Mode.SUBTRACT)
    extrude(amount=F1_DEPTH)


solid = f1.part
